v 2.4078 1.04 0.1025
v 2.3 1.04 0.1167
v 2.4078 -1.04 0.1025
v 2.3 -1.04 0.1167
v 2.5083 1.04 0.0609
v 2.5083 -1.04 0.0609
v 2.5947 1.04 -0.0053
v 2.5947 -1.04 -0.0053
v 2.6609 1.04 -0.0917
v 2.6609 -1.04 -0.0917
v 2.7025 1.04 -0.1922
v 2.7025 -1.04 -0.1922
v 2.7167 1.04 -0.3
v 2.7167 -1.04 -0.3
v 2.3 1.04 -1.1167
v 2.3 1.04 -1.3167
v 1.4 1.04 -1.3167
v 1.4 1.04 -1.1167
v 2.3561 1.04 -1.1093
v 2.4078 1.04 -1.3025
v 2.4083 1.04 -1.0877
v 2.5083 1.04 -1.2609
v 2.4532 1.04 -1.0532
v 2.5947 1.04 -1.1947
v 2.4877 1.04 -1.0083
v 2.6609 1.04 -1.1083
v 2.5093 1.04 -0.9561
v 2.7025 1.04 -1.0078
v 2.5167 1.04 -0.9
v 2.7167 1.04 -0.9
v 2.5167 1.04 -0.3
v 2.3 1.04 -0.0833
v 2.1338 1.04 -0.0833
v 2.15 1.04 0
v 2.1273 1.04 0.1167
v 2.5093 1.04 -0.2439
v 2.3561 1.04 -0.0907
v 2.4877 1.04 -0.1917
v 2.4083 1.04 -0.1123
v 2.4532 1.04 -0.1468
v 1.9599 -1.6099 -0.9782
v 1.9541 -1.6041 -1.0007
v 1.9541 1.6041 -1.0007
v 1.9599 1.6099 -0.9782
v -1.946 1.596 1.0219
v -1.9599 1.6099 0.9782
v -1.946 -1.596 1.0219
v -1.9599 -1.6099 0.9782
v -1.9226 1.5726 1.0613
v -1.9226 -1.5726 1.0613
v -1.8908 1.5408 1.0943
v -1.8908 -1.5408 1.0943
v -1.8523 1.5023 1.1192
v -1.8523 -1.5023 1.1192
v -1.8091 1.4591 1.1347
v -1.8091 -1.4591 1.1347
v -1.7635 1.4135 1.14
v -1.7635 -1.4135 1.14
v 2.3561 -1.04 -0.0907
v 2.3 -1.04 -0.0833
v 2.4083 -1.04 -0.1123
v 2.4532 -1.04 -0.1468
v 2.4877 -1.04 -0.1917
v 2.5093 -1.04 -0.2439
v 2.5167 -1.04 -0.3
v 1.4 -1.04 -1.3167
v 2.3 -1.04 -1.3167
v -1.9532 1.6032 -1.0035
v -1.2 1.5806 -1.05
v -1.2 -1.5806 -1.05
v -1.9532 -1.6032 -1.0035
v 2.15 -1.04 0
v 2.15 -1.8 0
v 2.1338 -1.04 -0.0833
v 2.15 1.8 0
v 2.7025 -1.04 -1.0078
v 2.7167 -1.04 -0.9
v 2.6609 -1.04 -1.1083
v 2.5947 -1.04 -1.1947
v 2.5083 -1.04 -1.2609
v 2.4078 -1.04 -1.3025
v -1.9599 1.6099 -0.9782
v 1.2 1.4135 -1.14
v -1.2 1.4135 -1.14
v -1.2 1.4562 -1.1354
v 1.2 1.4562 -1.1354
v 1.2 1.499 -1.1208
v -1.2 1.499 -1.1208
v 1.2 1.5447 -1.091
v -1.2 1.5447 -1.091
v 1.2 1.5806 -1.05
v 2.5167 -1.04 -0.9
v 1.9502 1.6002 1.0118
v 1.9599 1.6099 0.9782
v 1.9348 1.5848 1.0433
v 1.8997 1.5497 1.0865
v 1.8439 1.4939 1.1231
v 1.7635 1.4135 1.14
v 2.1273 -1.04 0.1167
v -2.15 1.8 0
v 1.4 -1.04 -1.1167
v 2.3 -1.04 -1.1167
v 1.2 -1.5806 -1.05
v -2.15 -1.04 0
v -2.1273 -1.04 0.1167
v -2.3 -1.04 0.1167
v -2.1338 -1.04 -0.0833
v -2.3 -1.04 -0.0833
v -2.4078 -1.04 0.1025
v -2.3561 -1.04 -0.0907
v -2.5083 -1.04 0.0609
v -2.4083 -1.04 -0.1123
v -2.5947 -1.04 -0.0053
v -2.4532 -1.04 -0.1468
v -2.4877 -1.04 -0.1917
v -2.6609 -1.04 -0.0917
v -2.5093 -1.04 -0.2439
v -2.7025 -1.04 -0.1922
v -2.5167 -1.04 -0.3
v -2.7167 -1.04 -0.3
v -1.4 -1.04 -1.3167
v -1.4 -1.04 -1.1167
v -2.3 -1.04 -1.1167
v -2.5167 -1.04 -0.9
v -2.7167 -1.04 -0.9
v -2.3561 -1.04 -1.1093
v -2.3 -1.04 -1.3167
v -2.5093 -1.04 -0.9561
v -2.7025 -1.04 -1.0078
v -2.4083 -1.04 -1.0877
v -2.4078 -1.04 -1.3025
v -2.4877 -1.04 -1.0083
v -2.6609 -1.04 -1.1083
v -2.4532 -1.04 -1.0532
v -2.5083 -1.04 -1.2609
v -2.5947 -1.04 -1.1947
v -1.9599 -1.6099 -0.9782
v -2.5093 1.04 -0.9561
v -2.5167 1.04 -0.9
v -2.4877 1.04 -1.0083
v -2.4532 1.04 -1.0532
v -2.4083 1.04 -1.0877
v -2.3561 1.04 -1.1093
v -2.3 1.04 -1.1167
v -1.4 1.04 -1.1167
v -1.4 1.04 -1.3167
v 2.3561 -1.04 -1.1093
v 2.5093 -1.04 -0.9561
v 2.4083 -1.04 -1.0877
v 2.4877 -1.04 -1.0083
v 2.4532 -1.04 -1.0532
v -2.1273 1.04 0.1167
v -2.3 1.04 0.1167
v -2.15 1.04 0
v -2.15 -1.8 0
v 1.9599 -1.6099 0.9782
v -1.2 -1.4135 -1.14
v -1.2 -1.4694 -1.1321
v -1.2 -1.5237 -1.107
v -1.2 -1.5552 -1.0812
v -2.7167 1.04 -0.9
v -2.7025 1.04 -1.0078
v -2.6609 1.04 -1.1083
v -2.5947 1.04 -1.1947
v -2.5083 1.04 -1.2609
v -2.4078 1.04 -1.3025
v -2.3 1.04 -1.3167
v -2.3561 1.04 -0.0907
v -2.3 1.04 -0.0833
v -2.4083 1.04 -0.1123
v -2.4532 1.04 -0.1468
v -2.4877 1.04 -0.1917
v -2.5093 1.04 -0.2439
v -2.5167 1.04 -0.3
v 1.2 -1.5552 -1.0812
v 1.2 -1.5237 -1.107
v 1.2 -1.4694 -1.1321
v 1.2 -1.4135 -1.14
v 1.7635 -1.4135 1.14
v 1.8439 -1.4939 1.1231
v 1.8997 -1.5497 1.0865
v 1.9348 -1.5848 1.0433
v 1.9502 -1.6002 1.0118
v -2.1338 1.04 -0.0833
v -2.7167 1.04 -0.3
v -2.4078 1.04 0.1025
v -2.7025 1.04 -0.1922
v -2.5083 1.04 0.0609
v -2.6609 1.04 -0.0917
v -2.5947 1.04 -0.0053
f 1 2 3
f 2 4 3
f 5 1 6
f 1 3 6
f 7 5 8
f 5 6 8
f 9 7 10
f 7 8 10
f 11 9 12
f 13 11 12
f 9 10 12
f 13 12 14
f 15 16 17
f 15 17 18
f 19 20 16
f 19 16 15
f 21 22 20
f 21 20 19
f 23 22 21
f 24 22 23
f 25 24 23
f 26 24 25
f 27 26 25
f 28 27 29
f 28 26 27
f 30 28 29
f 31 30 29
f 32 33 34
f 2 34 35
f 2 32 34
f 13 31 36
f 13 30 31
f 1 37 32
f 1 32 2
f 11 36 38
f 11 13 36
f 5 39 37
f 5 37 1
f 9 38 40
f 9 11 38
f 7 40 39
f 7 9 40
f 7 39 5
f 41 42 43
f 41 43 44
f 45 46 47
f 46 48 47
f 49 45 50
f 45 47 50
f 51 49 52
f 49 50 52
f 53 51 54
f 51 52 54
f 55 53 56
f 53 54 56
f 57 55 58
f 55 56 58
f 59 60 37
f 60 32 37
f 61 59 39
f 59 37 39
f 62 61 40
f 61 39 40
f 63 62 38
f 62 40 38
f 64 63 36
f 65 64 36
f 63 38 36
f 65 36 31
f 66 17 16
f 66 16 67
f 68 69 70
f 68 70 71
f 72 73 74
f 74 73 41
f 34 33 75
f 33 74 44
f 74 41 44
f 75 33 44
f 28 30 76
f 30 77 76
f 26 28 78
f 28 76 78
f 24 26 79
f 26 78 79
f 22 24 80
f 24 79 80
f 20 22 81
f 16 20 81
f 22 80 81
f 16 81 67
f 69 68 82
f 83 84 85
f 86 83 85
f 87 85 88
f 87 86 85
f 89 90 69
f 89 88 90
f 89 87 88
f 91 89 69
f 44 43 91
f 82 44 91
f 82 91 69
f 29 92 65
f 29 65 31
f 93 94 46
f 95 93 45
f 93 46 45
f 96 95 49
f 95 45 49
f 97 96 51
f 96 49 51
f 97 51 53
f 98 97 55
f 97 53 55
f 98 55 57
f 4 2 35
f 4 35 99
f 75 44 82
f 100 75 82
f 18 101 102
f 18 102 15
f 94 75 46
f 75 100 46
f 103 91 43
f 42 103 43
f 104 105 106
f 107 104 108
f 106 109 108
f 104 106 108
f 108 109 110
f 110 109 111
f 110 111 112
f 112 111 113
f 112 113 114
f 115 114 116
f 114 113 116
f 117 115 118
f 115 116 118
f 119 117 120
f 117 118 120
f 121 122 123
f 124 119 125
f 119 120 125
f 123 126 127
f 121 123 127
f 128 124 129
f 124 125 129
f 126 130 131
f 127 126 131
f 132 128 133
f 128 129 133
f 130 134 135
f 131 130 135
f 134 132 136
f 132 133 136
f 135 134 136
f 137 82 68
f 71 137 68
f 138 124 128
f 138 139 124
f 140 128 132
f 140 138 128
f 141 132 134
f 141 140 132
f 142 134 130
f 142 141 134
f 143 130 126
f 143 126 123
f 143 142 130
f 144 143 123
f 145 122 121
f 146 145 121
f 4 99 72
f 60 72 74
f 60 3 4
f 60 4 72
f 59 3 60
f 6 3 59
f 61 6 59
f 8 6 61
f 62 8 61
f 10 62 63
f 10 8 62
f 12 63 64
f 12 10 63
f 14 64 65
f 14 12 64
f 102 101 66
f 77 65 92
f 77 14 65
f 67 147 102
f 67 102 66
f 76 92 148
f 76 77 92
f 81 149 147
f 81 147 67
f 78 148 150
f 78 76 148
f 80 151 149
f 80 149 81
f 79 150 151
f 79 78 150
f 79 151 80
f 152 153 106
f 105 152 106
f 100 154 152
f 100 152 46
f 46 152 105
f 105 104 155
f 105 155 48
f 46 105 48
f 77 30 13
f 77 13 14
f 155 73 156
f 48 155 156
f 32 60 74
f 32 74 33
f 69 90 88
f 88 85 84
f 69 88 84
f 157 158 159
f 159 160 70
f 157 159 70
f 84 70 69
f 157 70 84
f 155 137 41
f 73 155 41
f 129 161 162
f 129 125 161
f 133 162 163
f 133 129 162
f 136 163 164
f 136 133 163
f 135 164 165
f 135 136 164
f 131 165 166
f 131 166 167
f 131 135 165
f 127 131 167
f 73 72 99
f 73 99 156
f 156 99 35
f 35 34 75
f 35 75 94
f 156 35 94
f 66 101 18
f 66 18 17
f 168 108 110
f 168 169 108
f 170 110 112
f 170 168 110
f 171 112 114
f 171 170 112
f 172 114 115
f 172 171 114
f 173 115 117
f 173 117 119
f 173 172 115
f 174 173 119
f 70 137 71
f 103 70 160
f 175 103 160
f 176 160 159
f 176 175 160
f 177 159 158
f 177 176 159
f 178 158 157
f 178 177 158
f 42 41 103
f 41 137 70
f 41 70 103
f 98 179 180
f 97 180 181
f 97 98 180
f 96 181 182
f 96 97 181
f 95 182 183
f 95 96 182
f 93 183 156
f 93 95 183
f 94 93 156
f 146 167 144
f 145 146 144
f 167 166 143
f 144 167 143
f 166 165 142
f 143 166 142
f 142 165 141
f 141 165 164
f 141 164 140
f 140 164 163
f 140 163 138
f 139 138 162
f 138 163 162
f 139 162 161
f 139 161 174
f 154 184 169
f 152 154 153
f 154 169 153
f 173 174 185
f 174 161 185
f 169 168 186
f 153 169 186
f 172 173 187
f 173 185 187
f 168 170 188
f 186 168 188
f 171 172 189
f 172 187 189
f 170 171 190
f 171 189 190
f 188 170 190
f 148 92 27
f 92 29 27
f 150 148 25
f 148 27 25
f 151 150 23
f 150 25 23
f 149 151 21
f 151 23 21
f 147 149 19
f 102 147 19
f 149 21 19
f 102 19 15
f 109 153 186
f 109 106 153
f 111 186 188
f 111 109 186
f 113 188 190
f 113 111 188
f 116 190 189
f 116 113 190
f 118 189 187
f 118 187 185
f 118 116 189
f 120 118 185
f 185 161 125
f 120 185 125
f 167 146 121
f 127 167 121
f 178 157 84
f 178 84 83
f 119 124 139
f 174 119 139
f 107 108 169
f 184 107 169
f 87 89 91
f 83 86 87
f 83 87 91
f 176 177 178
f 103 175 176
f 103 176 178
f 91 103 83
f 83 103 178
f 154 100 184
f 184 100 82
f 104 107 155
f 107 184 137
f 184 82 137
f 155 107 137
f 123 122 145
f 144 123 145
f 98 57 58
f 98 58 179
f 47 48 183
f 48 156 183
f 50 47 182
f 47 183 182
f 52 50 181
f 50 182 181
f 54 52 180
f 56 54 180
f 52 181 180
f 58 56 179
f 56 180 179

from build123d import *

# Parameters (mm, degrees)
SKETCH1_W                = 4.3
SKETCH1_H                = 3.6
EXTRUDE1_DEPTH           = 1.14
EXTRUDE1_TAPER           = 11
EXTRUDE1_OTHER_WAY_DEPTH = 1.14
EXTRUDE1_OTHER_WAY_TAPER = 11
FILLET1_R                = 0.2
CUT_EXTRUDE2_DEPTH       = 10.2
CUT_EXTRUDE2_DEPTH_BACK  = 10.2
SKETCH6_W                = 0.2
SKETCH6_H                = 2.08


with BuildPart() as part:
    # Sketch1 → Extrude1 (new body)
    with BuildSketch(Plane.XY):
        Rectangle(SKETCH1_W, SKETCH1_H)
    extrude(amount=EXTRUDE1_DEPTH, taper=EXTRUDE1_TAPER)

    # Sketch1 → Extrude1 other way (add)
    with BuildSketch(Plane.XY):
        Rectangle(SKETCH1_W, SKETCH1_H)
    extrude(amount=-EXTRUDE1_OTHER_WAY_DEPTH, taper=EXTRUDE1_OTHER_WAY_TAPER)

    # Fillet1
    fillet1_edges = [part.edges().sort_by_distance(p)[0] for p in [
        (1.928406448, 0, 1.14),
        (-1.928406448, 0, -1.14),
        (0, 1.578406448, -1.14),
        (1.928406448, 0, -1.14),
        (0, 1.578406448, 1.14),
        (0, -1.578406448, -1.14),
        (-1.928406448, 0, 1.14),
        (0, -1.578406448, 1.14),
    ]]
    fillet(fillet1_edges, radius=FILLET1_R)

    # Sketch4 → Cut-Extrude2 (cut, two sides: drawn at the far end of the back side and taken through both)
    with BuildSketch(Plane(origin=(0, 0, 0), x_dir=(1, 0, 0), z_dir=(0, 1, 0)).offset(-CUT_EXTRUDE2_DEPTH_BACK)):
        Polygon((1.2, 1.05), (3.492421082, 0.9), (3.492421082, 2.05), (1.2, 2.05), align=None)
        Polygon((-3.627687387, 2.05), (-1.2, 2.05), (-1.2, 1.05), (-3.627687387, 0.9), align=None)
    extrude(amount=CUT_EXTRUDE2_DEPTH + CUT_EXTRUDE2_DEPTH_BACK, mode=Mode.SUBTRACT)

    # Sweep1: sweep along a path in Sketch5
    with BuildLine(Plane(origin=(0, 0, 0), x_dir=(1, 0, 0), z_dir=(0, 1, 0))) as sweep1_path:
        Line((0, 0), (2.3, 0))
        ThreePointArc((2.3, 0), (2.512132034, 0.087867966), (2.6, 0.3))
        Line((2.6, 0.3), (2.6, 0.9))
        ThreePointArc((2.6, 0.9), (2.512132034, 1.112132034), (2.3, 1.2))
        Line((2.3, 1.2), (1.4, 1.2))
    # Sketch6 → Sweep1 (sweep)
    with BuildSketch(Plane(origin=(0, 0, 0), x_dir=(0, 0, -1), z_dir=(1, 0, 0))):
        with Locations((-0.016698904, 0)):
            Rectangle(SKETCH6_W, SKETCH6_H)
    sweep1 = sweep(path=sweep1_path.line)

    # Mirror1: Sweep1 across plane
    add(sweep1.mirror(Plane(origin=(0, 0, 0), x_dir=(0, 0, 1), z_dir=(1, 0, 0))))


solid = part.part
